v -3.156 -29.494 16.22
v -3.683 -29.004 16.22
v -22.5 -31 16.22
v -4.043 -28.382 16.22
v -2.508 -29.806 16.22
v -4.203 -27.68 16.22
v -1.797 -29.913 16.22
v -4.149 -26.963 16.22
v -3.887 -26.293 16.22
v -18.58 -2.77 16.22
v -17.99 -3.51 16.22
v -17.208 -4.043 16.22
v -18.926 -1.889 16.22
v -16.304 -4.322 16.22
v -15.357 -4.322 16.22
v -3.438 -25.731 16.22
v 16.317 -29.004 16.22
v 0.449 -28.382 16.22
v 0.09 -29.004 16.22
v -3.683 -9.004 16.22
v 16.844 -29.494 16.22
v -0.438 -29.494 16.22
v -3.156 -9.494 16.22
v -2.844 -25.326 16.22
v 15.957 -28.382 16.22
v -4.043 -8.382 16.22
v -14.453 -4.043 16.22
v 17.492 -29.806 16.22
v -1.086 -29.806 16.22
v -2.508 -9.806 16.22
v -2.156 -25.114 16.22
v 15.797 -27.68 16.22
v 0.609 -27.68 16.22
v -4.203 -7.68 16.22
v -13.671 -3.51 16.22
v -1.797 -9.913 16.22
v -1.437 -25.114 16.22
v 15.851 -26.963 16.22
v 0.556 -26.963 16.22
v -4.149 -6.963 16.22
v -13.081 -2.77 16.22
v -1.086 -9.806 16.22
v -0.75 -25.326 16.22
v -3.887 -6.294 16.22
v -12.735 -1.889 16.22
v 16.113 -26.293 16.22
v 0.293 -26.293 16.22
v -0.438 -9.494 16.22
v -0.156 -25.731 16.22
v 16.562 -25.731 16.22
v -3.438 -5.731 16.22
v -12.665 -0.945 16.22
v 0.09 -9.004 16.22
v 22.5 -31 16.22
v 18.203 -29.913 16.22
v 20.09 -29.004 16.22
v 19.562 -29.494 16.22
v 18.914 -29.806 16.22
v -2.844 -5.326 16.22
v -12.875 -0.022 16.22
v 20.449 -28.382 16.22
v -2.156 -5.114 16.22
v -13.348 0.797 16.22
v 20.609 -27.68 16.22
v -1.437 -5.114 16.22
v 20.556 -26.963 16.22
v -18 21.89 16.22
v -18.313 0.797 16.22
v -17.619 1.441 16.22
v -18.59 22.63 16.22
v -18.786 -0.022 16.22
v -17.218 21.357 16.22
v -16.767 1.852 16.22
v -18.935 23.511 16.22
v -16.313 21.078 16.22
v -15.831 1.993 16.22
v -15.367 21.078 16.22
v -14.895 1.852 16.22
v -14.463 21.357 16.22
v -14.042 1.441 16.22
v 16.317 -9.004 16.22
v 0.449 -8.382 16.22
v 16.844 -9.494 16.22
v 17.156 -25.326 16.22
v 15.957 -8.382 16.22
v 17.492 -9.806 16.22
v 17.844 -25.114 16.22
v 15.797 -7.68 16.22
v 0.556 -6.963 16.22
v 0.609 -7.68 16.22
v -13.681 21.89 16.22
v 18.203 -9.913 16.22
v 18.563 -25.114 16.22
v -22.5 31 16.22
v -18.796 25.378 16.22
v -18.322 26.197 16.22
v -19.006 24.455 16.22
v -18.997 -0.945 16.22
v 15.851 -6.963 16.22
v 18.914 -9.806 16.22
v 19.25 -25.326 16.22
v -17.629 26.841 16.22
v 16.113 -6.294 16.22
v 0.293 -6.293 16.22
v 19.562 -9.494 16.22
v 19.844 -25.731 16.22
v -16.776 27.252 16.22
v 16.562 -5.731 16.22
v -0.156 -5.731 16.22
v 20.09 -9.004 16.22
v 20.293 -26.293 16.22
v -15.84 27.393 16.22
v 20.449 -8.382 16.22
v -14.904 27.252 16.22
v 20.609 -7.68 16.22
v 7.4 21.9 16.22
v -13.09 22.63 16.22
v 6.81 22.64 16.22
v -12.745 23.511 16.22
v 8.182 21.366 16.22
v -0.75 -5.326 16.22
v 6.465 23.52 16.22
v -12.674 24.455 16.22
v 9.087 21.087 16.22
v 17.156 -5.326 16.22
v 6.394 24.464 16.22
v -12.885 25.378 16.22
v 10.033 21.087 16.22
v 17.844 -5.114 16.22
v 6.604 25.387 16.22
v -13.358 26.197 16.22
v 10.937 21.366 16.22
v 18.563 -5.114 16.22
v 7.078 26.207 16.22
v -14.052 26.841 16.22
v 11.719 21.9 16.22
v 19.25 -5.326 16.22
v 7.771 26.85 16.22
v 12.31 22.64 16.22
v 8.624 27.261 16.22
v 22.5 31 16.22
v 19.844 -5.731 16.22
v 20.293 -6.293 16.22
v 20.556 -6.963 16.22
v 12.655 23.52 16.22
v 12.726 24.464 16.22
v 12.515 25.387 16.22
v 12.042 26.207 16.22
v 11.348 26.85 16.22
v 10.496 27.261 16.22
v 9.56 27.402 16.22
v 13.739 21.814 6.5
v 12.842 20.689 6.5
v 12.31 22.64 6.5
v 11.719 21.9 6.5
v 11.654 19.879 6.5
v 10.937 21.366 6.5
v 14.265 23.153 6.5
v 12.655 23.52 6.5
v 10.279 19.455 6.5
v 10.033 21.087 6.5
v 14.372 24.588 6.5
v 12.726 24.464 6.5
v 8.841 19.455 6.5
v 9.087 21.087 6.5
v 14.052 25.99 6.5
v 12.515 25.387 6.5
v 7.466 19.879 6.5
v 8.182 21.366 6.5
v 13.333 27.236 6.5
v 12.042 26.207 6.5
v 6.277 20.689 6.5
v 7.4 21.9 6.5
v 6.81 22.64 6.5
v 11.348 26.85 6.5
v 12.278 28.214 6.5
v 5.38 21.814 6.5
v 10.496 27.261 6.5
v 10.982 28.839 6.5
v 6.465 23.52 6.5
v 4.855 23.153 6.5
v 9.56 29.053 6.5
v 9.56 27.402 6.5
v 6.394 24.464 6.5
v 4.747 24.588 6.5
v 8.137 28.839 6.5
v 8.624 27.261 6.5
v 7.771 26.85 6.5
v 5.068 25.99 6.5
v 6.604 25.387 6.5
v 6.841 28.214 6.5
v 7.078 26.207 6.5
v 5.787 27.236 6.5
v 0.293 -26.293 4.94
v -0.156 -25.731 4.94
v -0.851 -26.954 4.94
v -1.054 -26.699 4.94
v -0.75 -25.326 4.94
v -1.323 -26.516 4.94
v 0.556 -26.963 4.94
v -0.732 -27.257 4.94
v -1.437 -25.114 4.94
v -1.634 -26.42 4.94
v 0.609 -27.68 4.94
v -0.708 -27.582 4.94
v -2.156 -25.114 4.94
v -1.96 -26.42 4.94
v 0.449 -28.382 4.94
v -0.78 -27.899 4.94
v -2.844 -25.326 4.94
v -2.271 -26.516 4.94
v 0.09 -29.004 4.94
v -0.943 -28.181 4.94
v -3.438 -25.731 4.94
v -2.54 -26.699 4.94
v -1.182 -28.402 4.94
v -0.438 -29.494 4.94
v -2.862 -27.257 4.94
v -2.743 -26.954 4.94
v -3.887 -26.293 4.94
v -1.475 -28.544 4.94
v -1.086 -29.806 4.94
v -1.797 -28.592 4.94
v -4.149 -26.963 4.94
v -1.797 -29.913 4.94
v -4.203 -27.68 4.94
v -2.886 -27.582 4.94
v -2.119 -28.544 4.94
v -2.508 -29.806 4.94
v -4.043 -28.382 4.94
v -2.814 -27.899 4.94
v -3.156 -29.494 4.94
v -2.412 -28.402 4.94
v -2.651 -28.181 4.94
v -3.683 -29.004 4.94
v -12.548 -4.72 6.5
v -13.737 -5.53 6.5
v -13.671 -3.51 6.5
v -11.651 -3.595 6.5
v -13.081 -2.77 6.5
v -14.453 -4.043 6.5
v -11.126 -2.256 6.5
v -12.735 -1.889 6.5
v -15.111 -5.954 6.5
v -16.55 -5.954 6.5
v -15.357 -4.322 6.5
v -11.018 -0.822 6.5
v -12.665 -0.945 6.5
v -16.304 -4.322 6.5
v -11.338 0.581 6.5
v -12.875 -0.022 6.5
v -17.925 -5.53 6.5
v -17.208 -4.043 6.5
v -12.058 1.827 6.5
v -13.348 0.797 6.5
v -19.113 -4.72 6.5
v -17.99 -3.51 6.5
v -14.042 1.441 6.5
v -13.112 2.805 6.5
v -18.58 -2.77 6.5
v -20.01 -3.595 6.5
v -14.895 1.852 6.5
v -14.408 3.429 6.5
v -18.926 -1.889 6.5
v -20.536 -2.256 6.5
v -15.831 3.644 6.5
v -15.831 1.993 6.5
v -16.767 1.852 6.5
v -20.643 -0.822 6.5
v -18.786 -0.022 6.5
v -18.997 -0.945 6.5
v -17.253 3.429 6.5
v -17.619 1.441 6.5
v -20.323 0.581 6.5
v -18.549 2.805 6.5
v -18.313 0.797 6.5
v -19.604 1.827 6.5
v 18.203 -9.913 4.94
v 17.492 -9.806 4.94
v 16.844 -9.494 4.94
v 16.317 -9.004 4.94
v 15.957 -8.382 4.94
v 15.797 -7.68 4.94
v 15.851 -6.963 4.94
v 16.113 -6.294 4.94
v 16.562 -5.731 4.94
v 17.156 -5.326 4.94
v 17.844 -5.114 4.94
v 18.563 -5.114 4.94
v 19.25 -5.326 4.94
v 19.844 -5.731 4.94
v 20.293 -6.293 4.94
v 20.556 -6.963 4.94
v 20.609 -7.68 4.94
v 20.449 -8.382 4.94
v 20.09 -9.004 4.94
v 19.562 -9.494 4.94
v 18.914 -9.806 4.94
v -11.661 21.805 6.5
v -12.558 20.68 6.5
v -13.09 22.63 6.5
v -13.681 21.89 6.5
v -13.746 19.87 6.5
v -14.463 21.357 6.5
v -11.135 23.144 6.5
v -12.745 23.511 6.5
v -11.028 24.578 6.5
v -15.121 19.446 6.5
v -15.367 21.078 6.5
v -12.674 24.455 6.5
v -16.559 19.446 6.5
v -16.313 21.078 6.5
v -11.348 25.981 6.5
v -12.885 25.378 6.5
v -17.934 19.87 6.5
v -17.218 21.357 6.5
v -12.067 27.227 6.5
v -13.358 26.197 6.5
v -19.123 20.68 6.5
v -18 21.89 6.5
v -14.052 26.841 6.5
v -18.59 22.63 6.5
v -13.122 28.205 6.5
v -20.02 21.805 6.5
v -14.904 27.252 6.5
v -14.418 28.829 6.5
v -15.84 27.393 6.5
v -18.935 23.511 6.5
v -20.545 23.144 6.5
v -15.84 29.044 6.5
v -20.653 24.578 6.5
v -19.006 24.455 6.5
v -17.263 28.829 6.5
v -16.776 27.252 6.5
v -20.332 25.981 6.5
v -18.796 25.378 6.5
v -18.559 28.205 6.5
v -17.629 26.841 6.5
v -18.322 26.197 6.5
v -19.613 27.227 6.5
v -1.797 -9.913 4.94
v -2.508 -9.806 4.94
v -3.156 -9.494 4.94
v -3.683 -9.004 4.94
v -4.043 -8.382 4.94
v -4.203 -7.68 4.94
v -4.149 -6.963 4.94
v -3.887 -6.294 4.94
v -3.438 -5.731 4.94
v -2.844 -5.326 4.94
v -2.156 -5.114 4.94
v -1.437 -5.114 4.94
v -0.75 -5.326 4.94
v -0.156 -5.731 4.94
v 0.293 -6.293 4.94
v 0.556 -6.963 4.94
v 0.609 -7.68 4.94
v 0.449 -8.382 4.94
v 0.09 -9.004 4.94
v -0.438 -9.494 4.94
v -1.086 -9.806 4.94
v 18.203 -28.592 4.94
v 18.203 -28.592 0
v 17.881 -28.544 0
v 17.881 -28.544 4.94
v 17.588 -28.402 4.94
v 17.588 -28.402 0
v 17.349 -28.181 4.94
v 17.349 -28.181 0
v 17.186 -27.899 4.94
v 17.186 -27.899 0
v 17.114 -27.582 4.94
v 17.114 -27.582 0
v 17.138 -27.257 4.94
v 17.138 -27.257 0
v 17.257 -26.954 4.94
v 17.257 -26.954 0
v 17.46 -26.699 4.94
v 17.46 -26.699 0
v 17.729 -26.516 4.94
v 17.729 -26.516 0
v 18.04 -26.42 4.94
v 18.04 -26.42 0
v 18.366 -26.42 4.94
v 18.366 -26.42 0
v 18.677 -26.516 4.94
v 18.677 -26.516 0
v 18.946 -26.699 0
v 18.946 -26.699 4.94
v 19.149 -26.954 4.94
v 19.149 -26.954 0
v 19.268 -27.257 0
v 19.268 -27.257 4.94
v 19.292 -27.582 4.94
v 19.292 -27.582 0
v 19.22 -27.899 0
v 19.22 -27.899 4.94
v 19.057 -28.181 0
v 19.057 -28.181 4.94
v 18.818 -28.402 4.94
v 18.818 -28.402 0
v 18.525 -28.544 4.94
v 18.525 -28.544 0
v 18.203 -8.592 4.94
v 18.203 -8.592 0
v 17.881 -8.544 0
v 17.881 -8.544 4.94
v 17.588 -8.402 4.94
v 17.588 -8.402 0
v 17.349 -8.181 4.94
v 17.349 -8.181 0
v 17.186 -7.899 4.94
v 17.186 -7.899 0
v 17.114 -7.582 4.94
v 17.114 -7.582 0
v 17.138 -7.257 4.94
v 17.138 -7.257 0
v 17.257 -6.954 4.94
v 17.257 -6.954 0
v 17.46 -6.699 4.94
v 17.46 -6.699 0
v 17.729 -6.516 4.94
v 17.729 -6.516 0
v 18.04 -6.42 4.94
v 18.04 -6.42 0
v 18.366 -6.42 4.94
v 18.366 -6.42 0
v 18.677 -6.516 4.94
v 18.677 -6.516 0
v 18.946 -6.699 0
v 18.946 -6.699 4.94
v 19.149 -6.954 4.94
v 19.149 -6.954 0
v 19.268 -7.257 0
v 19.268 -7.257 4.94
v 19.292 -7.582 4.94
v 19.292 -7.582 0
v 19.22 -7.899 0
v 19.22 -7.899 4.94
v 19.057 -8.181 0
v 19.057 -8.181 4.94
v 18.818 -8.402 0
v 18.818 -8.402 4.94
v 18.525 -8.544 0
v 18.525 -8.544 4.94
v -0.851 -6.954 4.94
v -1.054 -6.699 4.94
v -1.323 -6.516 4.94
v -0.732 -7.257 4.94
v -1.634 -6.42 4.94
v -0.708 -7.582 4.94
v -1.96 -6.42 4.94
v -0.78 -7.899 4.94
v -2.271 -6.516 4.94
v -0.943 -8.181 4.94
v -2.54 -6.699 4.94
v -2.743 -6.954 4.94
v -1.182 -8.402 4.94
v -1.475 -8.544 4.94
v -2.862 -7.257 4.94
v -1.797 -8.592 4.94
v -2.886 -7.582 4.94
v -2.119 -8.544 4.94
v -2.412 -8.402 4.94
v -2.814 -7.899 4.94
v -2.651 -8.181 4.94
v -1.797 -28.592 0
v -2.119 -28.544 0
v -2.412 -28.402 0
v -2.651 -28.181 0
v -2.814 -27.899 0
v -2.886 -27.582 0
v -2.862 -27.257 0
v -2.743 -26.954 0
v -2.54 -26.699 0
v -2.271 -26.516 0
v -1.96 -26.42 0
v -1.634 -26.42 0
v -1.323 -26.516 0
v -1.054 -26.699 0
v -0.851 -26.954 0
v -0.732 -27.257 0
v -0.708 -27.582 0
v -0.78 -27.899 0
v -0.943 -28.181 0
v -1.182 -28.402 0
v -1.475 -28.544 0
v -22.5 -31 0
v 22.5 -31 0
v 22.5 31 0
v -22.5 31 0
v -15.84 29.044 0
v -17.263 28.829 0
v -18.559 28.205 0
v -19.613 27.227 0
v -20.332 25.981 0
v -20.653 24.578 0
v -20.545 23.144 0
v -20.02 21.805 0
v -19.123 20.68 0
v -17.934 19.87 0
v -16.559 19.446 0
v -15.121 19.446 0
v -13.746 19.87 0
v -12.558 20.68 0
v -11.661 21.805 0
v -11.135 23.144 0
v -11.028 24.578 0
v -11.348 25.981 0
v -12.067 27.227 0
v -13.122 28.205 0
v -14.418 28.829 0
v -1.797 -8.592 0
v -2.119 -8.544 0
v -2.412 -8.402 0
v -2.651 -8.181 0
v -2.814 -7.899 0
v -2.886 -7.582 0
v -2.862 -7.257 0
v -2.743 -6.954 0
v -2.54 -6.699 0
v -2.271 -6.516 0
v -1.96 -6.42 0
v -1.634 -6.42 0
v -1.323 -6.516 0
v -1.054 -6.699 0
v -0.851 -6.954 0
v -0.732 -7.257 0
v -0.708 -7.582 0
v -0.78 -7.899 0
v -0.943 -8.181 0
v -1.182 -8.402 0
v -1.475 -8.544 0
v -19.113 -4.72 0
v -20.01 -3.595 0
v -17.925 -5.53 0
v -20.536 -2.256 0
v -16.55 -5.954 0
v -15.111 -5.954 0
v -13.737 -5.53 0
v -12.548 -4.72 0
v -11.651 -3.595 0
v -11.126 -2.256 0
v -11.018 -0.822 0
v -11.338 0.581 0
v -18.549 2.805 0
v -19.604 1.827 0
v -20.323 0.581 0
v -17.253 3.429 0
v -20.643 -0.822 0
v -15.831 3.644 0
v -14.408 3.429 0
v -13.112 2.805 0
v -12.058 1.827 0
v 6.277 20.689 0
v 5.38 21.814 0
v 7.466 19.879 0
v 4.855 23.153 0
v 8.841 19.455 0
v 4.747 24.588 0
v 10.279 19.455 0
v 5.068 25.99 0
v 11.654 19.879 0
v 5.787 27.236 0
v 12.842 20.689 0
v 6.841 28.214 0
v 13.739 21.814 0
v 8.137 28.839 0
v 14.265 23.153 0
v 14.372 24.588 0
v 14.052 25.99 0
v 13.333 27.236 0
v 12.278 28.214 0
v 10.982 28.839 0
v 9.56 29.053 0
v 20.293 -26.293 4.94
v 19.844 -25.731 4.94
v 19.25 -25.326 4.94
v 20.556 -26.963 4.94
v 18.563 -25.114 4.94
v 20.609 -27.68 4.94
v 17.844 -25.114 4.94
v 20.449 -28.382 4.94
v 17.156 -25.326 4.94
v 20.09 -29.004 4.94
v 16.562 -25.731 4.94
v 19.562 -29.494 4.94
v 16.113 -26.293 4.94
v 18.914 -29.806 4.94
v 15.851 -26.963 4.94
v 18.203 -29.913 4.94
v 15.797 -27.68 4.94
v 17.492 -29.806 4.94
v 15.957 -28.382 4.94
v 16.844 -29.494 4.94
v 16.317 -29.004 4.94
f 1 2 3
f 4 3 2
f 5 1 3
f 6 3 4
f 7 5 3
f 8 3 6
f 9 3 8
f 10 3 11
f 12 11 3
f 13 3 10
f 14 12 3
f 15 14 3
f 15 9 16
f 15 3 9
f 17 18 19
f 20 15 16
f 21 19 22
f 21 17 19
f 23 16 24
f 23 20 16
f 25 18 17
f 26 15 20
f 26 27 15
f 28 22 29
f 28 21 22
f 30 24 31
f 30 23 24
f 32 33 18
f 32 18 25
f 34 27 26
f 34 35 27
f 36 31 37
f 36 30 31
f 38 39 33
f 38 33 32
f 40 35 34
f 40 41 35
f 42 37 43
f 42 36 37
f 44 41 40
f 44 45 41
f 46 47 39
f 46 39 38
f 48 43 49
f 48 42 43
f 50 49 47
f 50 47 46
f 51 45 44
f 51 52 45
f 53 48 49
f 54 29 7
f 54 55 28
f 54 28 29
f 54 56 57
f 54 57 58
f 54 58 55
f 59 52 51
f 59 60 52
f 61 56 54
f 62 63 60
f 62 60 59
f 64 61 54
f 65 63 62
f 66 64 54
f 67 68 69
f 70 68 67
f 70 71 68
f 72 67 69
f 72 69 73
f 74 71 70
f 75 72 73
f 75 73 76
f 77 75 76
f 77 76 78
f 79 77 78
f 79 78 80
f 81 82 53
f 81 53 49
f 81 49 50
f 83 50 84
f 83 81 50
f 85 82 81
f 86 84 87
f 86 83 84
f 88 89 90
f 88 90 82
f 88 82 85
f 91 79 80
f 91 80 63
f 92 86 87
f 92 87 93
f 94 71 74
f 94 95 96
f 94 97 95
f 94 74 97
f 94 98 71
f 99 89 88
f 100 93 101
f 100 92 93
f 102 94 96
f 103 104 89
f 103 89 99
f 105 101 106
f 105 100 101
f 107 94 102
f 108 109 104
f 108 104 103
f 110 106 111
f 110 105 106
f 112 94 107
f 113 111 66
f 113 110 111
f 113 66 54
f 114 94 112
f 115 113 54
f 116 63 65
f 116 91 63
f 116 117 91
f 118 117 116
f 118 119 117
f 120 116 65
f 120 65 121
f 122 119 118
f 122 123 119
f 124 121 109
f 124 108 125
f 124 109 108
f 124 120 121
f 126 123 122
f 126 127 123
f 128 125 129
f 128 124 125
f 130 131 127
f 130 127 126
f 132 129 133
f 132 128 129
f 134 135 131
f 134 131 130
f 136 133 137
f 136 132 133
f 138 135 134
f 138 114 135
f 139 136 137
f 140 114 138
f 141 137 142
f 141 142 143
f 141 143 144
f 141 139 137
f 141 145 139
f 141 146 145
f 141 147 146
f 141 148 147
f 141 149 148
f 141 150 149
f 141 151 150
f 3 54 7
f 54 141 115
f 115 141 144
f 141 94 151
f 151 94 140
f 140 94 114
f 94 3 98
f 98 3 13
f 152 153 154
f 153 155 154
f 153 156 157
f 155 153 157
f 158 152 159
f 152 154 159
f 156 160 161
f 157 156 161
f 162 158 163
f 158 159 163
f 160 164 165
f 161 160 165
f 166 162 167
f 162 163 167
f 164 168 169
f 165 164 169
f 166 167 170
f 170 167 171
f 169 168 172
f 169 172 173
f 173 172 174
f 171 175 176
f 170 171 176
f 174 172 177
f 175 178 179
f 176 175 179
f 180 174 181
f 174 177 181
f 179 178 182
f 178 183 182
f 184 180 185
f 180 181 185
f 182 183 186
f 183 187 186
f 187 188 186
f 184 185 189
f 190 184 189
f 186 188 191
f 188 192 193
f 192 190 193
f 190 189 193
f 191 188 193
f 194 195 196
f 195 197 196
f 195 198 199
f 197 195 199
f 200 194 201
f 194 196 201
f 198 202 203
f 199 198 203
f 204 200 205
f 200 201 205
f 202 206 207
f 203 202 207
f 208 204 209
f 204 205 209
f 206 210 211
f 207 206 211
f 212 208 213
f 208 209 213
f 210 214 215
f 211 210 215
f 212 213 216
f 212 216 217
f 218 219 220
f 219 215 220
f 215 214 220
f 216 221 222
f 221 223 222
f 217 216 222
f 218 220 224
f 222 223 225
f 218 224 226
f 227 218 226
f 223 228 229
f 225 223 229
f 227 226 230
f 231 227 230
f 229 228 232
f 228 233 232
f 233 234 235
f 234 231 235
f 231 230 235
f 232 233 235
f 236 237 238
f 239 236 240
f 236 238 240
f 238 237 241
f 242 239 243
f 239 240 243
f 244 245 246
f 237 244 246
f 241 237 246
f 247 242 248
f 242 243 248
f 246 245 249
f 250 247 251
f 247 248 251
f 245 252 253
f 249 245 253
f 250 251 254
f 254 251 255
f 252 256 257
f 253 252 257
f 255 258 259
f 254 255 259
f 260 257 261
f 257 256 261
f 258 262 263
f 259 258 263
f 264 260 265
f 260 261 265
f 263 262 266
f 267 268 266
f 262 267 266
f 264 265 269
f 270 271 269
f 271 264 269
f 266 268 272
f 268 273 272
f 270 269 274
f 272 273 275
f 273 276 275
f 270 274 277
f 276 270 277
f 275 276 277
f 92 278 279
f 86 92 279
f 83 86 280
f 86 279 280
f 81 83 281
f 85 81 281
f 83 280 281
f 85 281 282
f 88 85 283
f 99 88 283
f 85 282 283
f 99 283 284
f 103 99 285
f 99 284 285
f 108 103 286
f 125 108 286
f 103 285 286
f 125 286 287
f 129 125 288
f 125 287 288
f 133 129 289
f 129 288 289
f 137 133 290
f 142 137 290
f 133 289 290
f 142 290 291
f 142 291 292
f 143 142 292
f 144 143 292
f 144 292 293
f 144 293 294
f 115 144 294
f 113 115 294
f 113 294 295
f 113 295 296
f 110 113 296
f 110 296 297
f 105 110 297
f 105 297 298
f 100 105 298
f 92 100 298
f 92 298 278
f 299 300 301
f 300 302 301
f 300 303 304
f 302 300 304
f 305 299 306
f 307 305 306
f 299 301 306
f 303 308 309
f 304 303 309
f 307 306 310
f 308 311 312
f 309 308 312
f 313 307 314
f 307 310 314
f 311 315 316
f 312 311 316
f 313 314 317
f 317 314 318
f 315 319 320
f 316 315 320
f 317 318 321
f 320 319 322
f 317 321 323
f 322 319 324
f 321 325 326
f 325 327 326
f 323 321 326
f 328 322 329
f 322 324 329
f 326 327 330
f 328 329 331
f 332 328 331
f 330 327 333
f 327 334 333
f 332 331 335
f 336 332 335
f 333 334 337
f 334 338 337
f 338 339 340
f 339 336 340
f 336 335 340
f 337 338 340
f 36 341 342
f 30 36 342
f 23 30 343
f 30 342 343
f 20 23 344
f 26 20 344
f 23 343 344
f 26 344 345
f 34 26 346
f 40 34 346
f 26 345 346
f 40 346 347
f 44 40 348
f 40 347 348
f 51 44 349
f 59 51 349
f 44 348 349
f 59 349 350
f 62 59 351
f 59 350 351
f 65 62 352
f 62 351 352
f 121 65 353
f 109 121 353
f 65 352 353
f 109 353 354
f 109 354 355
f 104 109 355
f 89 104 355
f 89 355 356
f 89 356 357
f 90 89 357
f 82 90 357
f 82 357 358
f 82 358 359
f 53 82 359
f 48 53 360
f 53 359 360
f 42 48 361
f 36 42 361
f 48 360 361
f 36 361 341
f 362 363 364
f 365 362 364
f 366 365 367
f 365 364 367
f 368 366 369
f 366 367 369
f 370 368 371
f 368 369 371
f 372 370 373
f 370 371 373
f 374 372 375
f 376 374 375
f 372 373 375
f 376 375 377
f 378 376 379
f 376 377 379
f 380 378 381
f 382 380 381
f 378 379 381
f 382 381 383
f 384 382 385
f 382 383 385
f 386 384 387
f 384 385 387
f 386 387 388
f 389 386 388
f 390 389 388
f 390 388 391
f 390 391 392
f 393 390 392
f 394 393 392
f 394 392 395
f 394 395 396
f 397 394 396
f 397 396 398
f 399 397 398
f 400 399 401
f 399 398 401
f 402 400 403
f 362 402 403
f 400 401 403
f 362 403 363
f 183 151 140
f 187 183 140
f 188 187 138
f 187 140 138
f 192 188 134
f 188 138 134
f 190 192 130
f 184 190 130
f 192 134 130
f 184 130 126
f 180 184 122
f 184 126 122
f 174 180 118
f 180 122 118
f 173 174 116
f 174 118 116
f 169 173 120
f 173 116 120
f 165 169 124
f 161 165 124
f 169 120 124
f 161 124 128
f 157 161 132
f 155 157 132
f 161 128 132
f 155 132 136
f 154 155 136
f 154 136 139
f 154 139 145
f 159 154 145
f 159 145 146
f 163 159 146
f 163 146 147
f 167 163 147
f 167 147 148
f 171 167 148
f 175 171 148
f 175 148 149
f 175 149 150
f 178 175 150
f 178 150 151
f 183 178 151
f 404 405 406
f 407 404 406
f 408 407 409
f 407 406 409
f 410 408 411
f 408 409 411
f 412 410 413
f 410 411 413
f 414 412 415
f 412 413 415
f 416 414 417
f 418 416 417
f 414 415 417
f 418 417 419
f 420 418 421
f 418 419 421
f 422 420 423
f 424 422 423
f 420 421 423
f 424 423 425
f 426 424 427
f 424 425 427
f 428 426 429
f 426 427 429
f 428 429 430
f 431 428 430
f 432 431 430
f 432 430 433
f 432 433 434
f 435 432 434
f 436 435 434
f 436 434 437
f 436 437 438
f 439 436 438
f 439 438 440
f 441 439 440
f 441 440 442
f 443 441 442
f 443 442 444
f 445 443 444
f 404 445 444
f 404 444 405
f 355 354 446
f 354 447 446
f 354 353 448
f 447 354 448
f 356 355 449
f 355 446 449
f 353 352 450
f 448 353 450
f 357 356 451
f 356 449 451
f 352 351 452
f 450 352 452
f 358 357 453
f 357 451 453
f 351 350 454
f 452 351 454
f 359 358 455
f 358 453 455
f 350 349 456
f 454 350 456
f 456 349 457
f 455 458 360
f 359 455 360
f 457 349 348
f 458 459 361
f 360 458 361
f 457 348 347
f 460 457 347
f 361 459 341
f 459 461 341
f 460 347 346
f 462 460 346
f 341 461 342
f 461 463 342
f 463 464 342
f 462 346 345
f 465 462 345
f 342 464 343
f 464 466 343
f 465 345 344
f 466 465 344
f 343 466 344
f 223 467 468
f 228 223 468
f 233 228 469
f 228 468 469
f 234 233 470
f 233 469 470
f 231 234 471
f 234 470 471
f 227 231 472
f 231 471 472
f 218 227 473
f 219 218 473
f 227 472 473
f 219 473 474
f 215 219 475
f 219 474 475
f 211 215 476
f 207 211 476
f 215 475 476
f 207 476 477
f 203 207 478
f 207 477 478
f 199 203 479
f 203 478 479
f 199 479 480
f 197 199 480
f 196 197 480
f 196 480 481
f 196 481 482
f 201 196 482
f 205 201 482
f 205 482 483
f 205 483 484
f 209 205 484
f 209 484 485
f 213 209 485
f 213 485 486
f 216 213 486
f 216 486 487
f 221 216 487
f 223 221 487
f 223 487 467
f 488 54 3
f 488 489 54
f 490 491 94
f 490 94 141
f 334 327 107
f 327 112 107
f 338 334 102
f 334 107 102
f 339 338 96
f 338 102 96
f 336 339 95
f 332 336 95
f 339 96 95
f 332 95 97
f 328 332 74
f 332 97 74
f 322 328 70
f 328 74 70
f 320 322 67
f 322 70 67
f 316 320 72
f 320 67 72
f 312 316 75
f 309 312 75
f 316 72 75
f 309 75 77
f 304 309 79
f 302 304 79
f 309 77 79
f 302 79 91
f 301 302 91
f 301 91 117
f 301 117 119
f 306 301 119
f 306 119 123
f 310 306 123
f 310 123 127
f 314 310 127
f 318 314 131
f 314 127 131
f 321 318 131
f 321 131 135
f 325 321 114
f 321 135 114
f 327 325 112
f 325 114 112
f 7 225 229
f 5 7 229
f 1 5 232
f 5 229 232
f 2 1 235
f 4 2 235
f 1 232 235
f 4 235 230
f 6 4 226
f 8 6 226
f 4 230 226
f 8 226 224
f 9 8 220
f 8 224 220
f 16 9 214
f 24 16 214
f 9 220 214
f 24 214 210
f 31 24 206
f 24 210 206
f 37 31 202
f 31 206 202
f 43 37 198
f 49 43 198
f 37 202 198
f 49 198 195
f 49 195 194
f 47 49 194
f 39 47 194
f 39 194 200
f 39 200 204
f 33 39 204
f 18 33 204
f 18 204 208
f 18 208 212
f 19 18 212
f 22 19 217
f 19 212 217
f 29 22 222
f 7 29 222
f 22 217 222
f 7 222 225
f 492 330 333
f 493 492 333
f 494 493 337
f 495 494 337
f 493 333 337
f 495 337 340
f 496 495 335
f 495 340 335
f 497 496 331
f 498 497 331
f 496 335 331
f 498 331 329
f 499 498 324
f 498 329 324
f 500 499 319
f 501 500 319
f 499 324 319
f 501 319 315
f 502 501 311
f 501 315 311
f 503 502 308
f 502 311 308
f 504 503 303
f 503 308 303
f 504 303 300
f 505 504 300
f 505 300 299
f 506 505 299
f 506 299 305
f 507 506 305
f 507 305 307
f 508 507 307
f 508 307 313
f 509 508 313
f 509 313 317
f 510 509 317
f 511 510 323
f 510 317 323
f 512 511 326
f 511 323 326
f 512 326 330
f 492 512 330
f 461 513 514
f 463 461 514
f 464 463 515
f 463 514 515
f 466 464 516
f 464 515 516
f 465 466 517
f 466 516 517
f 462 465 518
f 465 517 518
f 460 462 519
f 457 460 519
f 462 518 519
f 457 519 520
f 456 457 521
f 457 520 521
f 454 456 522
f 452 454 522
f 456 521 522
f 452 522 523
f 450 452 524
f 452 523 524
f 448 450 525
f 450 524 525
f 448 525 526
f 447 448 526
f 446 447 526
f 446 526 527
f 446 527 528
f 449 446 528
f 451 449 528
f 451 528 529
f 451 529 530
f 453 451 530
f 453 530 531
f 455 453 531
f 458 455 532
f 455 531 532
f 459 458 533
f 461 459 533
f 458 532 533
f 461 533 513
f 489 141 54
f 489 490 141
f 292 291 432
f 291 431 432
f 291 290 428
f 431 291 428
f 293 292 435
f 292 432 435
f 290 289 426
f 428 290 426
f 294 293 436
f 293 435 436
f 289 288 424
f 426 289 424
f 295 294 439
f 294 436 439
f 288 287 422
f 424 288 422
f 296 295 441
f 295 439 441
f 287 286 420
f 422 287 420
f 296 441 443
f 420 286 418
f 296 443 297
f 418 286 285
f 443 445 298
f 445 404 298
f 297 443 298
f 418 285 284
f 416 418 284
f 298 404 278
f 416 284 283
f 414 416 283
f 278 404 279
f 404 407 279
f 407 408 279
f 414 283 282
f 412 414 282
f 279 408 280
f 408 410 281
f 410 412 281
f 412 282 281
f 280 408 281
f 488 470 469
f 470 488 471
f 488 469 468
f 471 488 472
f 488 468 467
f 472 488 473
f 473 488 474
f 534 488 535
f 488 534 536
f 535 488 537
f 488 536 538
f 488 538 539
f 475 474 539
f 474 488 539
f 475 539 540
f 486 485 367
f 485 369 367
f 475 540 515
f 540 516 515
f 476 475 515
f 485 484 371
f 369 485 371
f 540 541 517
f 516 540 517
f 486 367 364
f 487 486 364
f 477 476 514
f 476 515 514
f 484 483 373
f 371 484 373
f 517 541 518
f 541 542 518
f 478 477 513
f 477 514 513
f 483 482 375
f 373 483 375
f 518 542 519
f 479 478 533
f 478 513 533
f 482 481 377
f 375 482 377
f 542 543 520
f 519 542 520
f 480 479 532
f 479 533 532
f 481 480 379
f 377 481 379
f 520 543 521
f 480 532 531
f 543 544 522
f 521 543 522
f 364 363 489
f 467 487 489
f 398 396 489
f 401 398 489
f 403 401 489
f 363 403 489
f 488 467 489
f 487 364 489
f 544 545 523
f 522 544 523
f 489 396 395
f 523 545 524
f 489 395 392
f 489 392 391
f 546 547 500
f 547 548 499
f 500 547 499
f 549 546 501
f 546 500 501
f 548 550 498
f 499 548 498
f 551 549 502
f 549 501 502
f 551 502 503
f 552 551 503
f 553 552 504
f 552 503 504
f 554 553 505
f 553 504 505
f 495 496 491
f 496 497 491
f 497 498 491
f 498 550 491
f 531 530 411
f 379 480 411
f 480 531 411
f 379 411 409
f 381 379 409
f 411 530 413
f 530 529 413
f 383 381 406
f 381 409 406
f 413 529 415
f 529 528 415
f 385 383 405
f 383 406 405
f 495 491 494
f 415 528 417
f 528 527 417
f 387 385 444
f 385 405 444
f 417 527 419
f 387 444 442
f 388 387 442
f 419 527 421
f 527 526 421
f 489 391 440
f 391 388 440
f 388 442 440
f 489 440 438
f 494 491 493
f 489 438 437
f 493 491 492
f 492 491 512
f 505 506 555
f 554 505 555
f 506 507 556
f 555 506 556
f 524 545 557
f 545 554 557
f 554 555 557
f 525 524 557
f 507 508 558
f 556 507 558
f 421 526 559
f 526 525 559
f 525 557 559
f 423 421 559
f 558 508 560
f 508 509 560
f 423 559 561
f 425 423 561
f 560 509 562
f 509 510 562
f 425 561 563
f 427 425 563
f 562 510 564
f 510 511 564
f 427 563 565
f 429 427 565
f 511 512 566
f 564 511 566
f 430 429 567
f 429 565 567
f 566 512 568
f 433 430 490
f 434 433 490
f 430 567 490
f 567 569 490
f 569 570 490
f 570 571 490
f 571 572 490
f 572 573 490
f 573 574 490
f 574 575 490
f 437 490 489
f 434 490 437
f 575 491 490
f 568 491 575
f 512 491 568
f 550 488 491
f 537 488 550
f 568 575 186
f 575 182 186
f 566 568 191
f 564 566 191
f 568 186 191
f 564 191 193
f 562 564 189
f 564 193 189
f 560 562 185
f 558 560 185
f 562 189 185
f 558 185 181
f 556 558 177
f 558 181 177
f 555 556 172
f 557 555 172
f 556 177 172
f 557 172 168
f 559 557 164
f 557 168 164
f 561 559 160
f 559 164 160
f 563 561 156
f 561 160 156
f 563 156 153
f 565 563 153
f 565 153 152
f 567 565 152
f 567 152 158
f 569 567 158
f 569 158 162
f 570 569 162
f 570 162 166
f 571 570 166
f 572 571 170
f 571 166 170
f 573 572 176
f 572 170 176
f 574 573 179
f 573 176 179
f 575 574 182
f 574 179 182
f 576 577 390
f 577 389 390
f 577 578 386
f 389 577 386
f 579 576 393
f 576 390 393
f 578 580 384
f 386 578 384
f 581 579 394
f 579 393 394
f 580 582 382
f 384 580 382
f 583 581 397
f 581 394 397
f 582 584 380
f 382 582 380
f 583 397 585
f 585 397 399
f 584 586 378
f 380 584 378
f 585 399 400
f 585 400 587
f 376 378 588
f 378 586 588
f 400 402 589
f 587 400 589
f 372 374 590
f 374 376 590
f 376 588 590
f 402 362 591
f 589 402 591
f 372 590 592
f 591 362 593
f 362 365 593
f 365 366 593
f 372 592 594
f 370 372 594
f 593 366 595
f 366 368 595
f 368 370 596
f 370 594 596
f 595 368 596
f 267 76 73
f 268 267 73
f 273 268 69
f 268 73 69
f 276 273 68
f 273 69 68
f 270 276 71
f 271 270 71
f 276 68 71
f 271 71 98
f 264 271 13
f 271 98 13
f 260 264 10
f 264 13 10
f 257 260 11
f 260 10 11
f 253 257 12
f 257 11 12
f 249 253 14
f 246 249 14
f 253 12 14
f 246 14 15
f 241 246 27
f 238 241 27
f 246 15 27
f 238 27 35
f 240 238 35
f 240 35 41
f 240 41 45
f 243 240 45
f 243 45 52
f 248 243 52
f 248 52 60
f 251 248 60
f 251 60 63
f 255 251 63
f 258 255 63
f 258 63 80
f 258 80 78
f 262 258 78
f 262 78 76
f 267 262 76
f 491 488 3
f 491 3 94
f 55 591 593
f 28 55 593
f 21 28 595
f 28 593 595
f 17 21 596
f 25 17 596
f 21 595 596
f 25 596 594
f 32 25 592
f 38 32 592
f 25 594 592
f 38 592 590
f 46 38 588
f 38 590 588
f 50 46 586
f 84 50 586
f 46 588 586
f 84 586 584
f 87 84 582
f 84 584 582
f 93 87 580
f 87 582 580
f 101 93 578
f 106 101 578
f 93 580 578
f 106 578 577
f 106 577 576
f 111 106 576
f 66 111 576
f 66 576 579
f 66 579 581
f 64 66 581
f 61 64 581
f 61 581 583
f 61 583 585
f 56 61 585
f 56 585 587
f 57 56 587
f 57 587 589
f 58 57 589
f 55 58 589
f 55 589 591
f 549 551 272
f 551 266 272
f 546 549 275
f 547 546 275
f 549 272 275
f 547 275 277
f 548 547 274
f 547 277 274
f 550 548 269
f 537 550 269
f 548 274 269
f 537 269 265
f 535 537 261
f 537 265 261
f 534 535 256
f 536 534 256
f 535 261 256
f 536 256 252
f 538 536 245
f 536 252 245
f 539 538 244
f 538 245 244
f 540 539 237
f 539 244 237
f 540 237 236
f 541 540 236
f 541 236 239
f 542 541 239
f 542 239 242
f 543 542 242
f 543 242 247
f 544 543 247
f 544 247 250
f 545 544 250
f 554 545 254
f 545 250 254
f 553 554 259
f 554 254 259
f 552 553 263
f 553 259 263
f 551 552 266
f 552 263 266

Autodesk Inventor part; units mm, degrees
ref_plane "YZ Plane" through (0, 0, 0) normal (1, 0, 0) x (0, 1, 0)
ref_plane "XZ Plane" through (0, 0, 0) normal (0, 1, 0) x (-1, 0, 0)
ref_plane "XY Plane" through (0, 0, 0) normal (0, 0, 1) x (1, 0, 0)
sketch "Sketch1" plane through (0, 0, 0) normal (0, 0, 1) x (1, 0, 0)
  line L0 (-22.5, 31) -> (22.5, 31)
  line L1 (22.5, 31) -> (22.5, -31)
  line L2 (22.5, -31) -> (-22.5, -31)
  line L3 (-22.5, -31) -> (-22.5, 31)
  point P0 (0, 0)
  dimension "d0" = 45
  dimension "d1" = 62
  dimension "d2" = 31
  dimension "d3" = 22.5
extrude "Extrusion1" add sketch "Sketch1" along normal blind 16.2198
sketch "Sketch2" plane through (0, 0, 0) normal (0, 0, -1) x (-1, 0, 0)
  arc A0 (79.5379, 557.794) -> (67.0425, 570.2987) centre (67.0379, 557.7987) ccw
  line L0 (67.0425, 570.2987) -> (-365.1574, 570.4588)
  arc A1 (-365.1574, 570.4588) -> (-377.6621, 557.9635) centre (-365.1621, 557.9588) ccw
  line L1 (-377.6621, 557.9635) -> (-377.8787, -26.6365)
  arc A2 (-377.8787, -26.6365) -> (-365.3834, -39.1411) centre (-365.3787, -26.6411) ccw
  line L2 (-365.3834, -39.1411) -> (66.8166, -39.3013)
  arc A3 (66.8166, -39.3013) -> (79.3212, -26.8059) centre (66.8212, -26.8013) ccw
  line L3 (79.3212, -26.8059) -> (79.5379, 557.794)
  circle A4 centre (-339.5621, 557.7494) radius 2.5527
  circle A5 centre (-314.1622, 557.7399) radius 2.5527
  circle A6 centre (-288.7622, 557.7305) radius 2.5527
  circle A7 centre (-263.3622, 557.7211) radius 2.5527
  circle A8 centre (-237.9622, 557.7117) radius 2.5527
  circle A9 centre (-212.5622, 557.7023) radius 2.5527
  circle A10 centre (-187.1622, 557.6929) radius 2.5527
  circle A11 centre (-161.7622, 557.6835) radius 2.5527
  circle A12 centre (-136.3622, 557.674) radius 2.5527
  circle A13 centre (-110.9622, 557.6646) radius 2.5527
  circle A14 centre (-85.5622, 557.6552) radius 2.5527
  circle A15 centre (-60.1622, 557.6458) radius 2.5527
  circle A16 centre (-34.7622, 557.6364) radius 2.5527
  circle A17 centre (-9.3622, 557.627) radius 2.5527
  circle A18 centre (16.0378, 557.6176) radius 2.5527
  circle A19 centre (41.4378, 557.6081) radius 2.5527
  circle A20 centre (66.8378, 557.5987) radius 2.5527
  circle A21 centre (-364.9716, 532.3588) radius 2.5527
  circle A22 centre (-339.5716, 532.3494) radius 2.5527
  circle A23 centre (-314.1716, 532.3399) radius 2.5527
  circle A24 centre (-288.7716, 532.3305) radius 2.5527
  circle A25 centre (-263.3716, 532.3211) radius 2.5527
  circle A26 centre (-237.9716, 532.3117) radius 2.5527
  circle A27 centre (-212.5716, 532.3023) radius 2.5527
  circle A28 centre (-187.1716, 532.2929) radius 2.5527
  circle A29 centre (-161.7716, 532.2835) radius 2.5527
  circle A30 centre (-136.3716, 532.274) radius 2.5527
  circle A31 centre (-110.9716, 532.2646) radius 2.5527
  circle A32 centre (-85.5716, 532.2552) radius 2.5527
  circle A33 centre (-60.1716, 532.2458) radius 2.5527
  circle A34 centre (-34.7716, 532.2364) radius 2.5527
  circle A35 centre (-9.3716, 532.227) radius 2.5527
  circle A36 centre (16.0284, 532.2176) radius 2.5527
  circle A37 centre (41.4284, 532.2081) radius 2.5527
  circle A38 centre (66.8284, 532.1987) radius 2.5527
  circle A39 centre (-364.981, 506.9588) radius 2.5527
  circle A40 centre (-339.581, 506.9494) radius 2.5527
  circle A41 centre (-314.181, 506.9399) radius 2.5527
  circle A42 centre (-288.781, 506.9305) radius 2.5527
  circle A43 centre (-263.381, 506.9211) radius 2.5527
  circle A44 centre (-237.981, 506.9117) radius 2.5527
  circle A45 centre (-212.581, 506.9023) radius 2.5527
  circle A46 centre (-187.181, 506.8929) radius 2.5527
  circle A47 centre (-161.781, 506.8835) radius 2.5527
  circle A48 centre (-136.381, 506.874) radius 2.5527
  circle A49 centre (-110.981, 506.8646) radius 2.5527
  circle A50 centre (-85.581, 506.8552) radius 2.5527
  circle A51 centre (-60.181, 506.8458) radius 2.5527
  circle A52 centre (-34.781, 506.8364) radius 2.5527
  circle A53 centre (-9.381, 506.827) radius 2.5527
  circle A54 centre (16.019, 506.8176) radius 2.5527
  circle A55 centre (41.419, 506.8082) radius 2.5527
  circle A56 centre (66.819, 506.7987) radius 2.5527
  circle A57 centre (-364.9904, 481.5588) radius 2.5527
  circle A58 centre (-339.5904, 481.5494) radius 2.5527
  circle A59 centre (-314.1904, 481.5399) radius 2.5527
  circle A60 centre (-288.7904, 481.5305) radius 2.5527
  circle A61 centre (-263.3904, 481.5211) radius 2.5527
  circle A62 centre (-237.9904, 481.5117) radius 2.5527
  circle A63 centre (-212.5904, 481.5023) radius 2.5527
  circle A64 centre (-187.1904, 481.4929) radius 2.5527
  circle A65 centre (-161.7904, 481.4835) radius 2.5527
  circle A66 centre (-136.3904, 481.474) radius 2.5527
  circle A67 centre (-110.9904, 481.4646) radius 2.5527
  circle A68 centre (-85.5904, 481.4552) radius 2.5527
  circle A69 centre (-60.1904, 481.4458) radius 2.5527
  circle A70 centre (-34.7904, 481.4364) radius 2.5527
  circle A71 centre (-9.3904, 481.427) radius 2.5527
  circle A72 centre (16.0096, 481.4176) radius 2.5527
  circle A73 centre (41.4096, 481.4082) radius 2.5527
  circle A74 centre (66.8096, 481.3987) radius 2.5527
  circle A75 centre (-364.9998, 456.1588) radius 2.5527
  circle A76 centre (-339.5998, 456.1494) radius 2.5527
  circle A77 centre (-314.1998, 456.1399) radius 2.5527
  circle A78 centre (-288.7998, 456.1305) radius 2.5527
  circle A79 centre (-263.3998, 456.1211) radius 2.5527
  circle A80 centre (-237.9998, 456.1117) radius 2.5527
  circle A81 centre (-212.5998, 456.1023) radius 2.5527
  circle A82 centre (-187.1998, 456.0929) radius 2.5527
  circle A83 centre (-161.7998, 456.0835) radius 2.5527
  circle A84 centre (-136.3998, 456.074) radius 2.5527
  circle A85 centre (-110.9998, 456.0646) radius 2.5527
  circle A86 centre (-85.5998, 456.0552) radius 2.5527
  circle A87 centre (-60.1998, 456.0458) radius 2.5527
  circle A88 centre (-34.7998, 456.0364) radius 2.5527
  circle A89 centre (-9.3998, 456.027) radius 2.5527
  circle A90 centre (16.0002, 456.0176) radius 2.5527
  circle A91 centre (41.4002, 456.0082) radius 2.5527
  circle A92 centre (66.8002, 455.9987) radius 2.5527
  circle A93 centre (-365.0092, 430.7588) radius 2.5527
  circle A94 centre (-339.6092, 430.7494) radius 2.5527
  circle A95 centre (-314.2092, 430.7399) radius 2.5527
  circle A96 centre (-288.8092, 430.7305) radius 2.5527
  circle A97 centre (-263.4092, 430.7211) radius 2.5527
  circle A98 centre (-238.0092, 430.7117) radius 2.5527
  circle A99 centre (-212.6092, 430.7023) radius 2.5527
  circle A100 centre (-187.2092, 430.6929) radius 2.5527
  circle A101 centre (-161.8092, 430.6835) radius 2.5527
  circle A102 centre (-136.4092, 430.6741) radius 2.5527
  circle A103 centre (-111.0092, 430.6646) radius 2.5527
  circle A104 centre (-85.6092, 430.6552) radius 2.5527
  circle A105 centre (-60.2092, 430.6458) radius 2.5527
  circle A106 centre (-34.8092, 430.6364) radius 2.5527
  circle A107 centre (-9.4092, 430.627) radius 2.5527
  circle A108 centre (15.9908, 430.6176) radius 2.5527
  circle A109 centre (41.3908, 430.6082) radius 2.5527
  circle A110 centre (66.7908, 430.5987) radius 2.5527
  circle A111 centre (-365.0186, 405.3588) radius 2.5527
  circle A112 centre (-339.6186, 405.3494) radius 2.5527
  circle A113 centre (-314.2186, 405.3399) radius 2.5527
  circle A114 centre (-288.8186, 405.3305) radius 2.5527
  circle A115 centre (-263.4186, 405.3211) radius 2.5527
  circle A116 centre (-238.0186, 405.3117) radius 2.5527
  circle A117 centre (-212.6186, 405.3023) radius 2.5527
  circle A118 centre (-187.2186, 405.2929) radius 2.5527
  circle A119 centre (-161.8186, 405.2835) radius 2.5527
  circle A120 centre (-136.4186, 405.2741) radius 2.5527
  circle A121 centre (-111.0186, 405.2646) radius 2.5527
  circle A122 centre (-85.6186, 405.2552) radius 2.5527
  circle A123 centre (-60.2186, 405.2458) radius 2.5527
  circle A124 centre (-34.8187, 405.2364) radius 2.5527
  circle A125 centre (-9.4187, 405.227) radius 2.5527
  circle A126 centre (15.9813, 405.2176) radius 2.5527
  circle A127 centre (41.3813, 405.2082) radius 2.5527
  circle A128 centre (66.7813, 405.1987) radius 2.5527
  circle A129 centre (-365.028, 379.9588) radius 2.5527
  circle A130 centre (-339.628, 379.9494) radius 2.5527
  circle A131 centre (-314.228, 379.94) radius 2.5527
  circle A132 centre (-288.828, 379.9305) radius 2.5527
  circle A133 centre (-263.428, 379.9211) radius 2.5527
  circle A134 centre (-238.0281, 379.9117) radius 2.5527
  circle A135 centre (-212.6281, 379.9023) radius 2.5527
  circle A136 centre (-187.2281, 379.8929) radius 2.5527
  circle A137 centre (-161.8281, 379.8835) radius 2.5527
  circle A138 centre (-136.4281, 379.8741) radius 2.5527
  circle A139 centre (-111.0281, 379.8646) radius 2.5527
  circle A140 centre (-85.6281, 379.8552) radius 2.5527
  circle A141 centre (-60.2281, 379.8458) radius 2.5527
  circle A142 centre (-34.8281, 379.8364) radius 2.5527
  circle A143 centre (-9.4281, 379.827) radius 2.5527
  circle A144 centre (15.9719, 379.8176) radius 2.5527
  circle A145 centre (41.3719, 379.8082) radius 2.5527
  circle A146 centre (66.7719, 379.7987) radius 2.5527
  circle A147 centre (-365.0375, 354.5588) radius 2.5527
  circle A148 centre (-339.6375, 354.5494) radius 2.5527
  circle A149 centre (-314.2375, 354.54) radius 2.5527
  circle A150 centre (-288.8375, 354.5305) radius 2.5527
  circle A151 centre (-263.4375, 354.5211) radius 2.5527
  circle A152 centre (-238.0375, 354.5117) radius 2.5527
  circle A153 centre (-212.6375, 354.5023) radius 2.5527
  circle A154 centre (-187.2375, 354.4929) radius 2.5527
  circle A155 centre (-161.8375, 354.4835) radius 2.5527
  circle A156 centre (-136.4375, 354.4741) radius 2.5527
  circle A157 centre (-111.0375, 354.4646) radius 2.5527
  circle A158 centre (-85.6375, 354.4552) radius 2.5527
  circle A159 centre (-60.2375, 354.4458) radius 2.5527
  circle A160 centre (-34.8375, 354.4364) radius 2.5527
  circle A161 centre (-9.4375, 354.427) radius 2.5527
  circle A162 centre (15.9625, 354.4176) radius 2.5527
  circle A163 centre (41.3625, 354.4082) radius 2.5527
  circle A164 centre (66.7625, 354.3987) radius 2.5527
  circle A165 centre (-365.0469, 329.1588) radius 2.5527
  circle A166 centre (-339.6469, 329.1494) radius 2.5527
  circle A167 centre (-314.2469, 329.14) radius 2.5527
  circle A168 centre (-288.8469, 329.1305) radius 2.5527
  circle A169 centre (-263.4469, 329.1211) radius 2.5527
  circle A170 centre (-238.0469, 329.1117) radius 2.5527
  circle A171 centre (-212.6469, 329.1023) radius 2.5527
  circle A172 centre (-187.2469, 329.0929) radius 2.5527
  circle A173 centre (-161.8469, 329.0835) radius 2.5527
  circle A174 centre (-136.4469, 329.0741) radius 2.5527
  circle A175 centre (-111.0469, 329.0646) radius 2.5527
  circle A176 centre (-85.6469, 329.0552) radius 2.5527
  circle A177 centre (-60.2469, 329.0458) radius 2.5527
  circle A178 centre (-34.8469, 329.0364) radius 2.5527
  circle A179 centre (-9.4469, 329.027) radius 2.5527
  circle A180 centre (15.9531, 329.0176) radius 2.5527
  circle A181 centre (41.3531, 329.0082) radius 2.5527
  circle A182 centre (66.7531, 328.9987) radius 2.5527
  circle A183 centre (-365.0563, 303.7588) radius 2.5527
  circle A184 centre (-339.6563, 303.7494) radius 2.5527
  circle A185 centre (-314.2563, 303.74) radius 2.5527
  circle A186 centre (-288.8563, 303.7305) radius 2.5527
  circle A187 centre (-263.4563, 303.7211) radius 2.5527
  circle A188 centre (-238.0563, 303.7117) radius 2.5527
  circle A189 centre (-212.6563, 303.7023) radius 2.5527
  circle A190 centre (-187.2563, 303.6929) radius 2.5527
  circle A191 centre (-161.8563, 303.6835) radius 2.5527
  circle A192 centre (-136.4563, 303.6741) radius 2.5527
  circle A193 centre (-111.0563, 303.6646) radius 2.5527
  circle A194 centre (-85.6563, 303.6552) radius 2.5527
  circle A195 centre (-60.2563, 303.6458) radius 2.5527
  circle A196 centre (-34.8563, 303.6364) radius 2.5527
  circle A197 centre (-9.4563, 303.627) radius 2.5527
  circle A198 centre (15.9437, 303.6176) radius 2.5527
  circle A199 centre (41.3437, 303.6082) radius 2.5527
  circle A200 centre (66.7437, 303.5988) radius 2.5527
  circle A201 centre (-365.0657, 278.3588) radius 2.5527
  circle A202 centre (-339.6657, 278.3494) radius 2.5527
  circle A203 centre (-314.2657, 278.34) radius 2.5527
  circle A204 centre (-288.8657, 278.3305) radius 2.5527
  circle A205 centre (-263.4657, 278.3211) radius 2.5527
  circle A206 centre (-238.0657, 278.3117) radius 2.5527
  circle A207 centre (-212.6657, 278.3023) radius 2.5527
  circle A208 centre (-187.2657, 278.2929) radius 2.5527
  circle A209 centre (-161.8657, 278.2835) radius 2.5527
  circle A210 centre (-136.4657, 278.2741) radius 2.5527
  circle A211 centre (-111.0657, 278.2646) radius 2.5527
  circle A212 centre (-85.6657, 278.2552) radius 2.5527
  circle A213 centre (-60.2657, 278.2458) radius 2.5527
  circle A214 centre (-34.8657, 278.2364) radius 2.5527
  circle A215 centre (-9.4657, 278.227) radius 2.5527
  circle A216 centre (15.9343, 278.2176) radius 2.5527
  circle A217 centre (41.3343, 278.2082) radius 2.5527
  circle A218 centre (66.7343, 278.1988) radius 2.5527
  circle A219 centre (-365.0751, 252.9588) radius 2.5527
  circle A220 centre (-339.6751, 252.9494) radius 2.5527
  circle A221 centre (-314.2751, 252.94) radius 2.5527
  circle A222 centre (-288.8751, 252.9305) radius 2.5527
  circle A223 centre (-263.4751, 252.9211) radius 2.5527
  circle A224 centre (-238.0751, 252.9117) radius 2.5527
  circle A225 centre (-212.6751, 252.9023) radius 2.5527
  circle A226 centre (-187.2751, 252.8929) radius 2.5527
  circle A227 centre (-161.8751, 252.8835) radius 2.5527
  circle A228 centre (-136.4751, 252.8741) radius 2.5527
  circle A229 centre (-111.0751, 252.8647) radius 2.5527
  circle A230 centre (-85.6751, 252.8552) radius 2.5527
  circle A231 centre (-60.2751, 252.8458) radius 2.5527
  circle A232 centre (-34.8751, 252.8364) radius 2.5527
  circle A233 centre (-9.4751, 252.827) radius 2.5527
  circle A234 centre (15.9249, 252.8176) radius 2.5527
  circle A235 centre (41.3249, 252.8082) radius 2.5527
  circle A236 centre (66.7249, 252.7988) radius 2.5527
  circle A237 centre (-365.0845, 227.5588) radius 2.5527
  circle A238 centre (-339.6845, 227.5494) radius 2.5527
  circle A239 centre (-314.2845, 227.54) radius 2.5527
  circle A240 centre (-288.8845, 227.5305) radius 2.5527
  circle A241 centre (-263.4845, 227.5211) radius 2.5527
  circle A242 centre (-238.0845, 227.5117) radius 2.5527
  circle A243 centre (-212.6845, 227.5023) radius 2.5527
  circle A244 centre (-187.2845, 227.4929) radius 2.5527
  circle A245 centre (-161.8845, 227.4835) radius 2.5527
  circle A246 centre (-136.4845, 227.4741) radius 2.5527
  circle A247 centre (-111.0845, 227.4647) radius 2.5527
  circle A248 centre (-85.6845, 227.4552) radius 2.5527
  circle A249 centre (-60.2845, 227.4458) radius 2.5527
  circle A250 centre (-34.8845, 227.4364) radius 2.5527
  circle A251 centre (-9.4845, 227.427) radius 2.5527
  circle A252 centre (15.9154, 227.4176) radius 2.5527
  circle A253 centre (41.3154, 227.4082) radius 2.5527
  circle A254 centre (66.7154, 227.3988) radius 2.5527
  circle A255 centre (-365.0939, 202.1588) radius 2.5527
  circle A256 centre (-339.6939, 202.1494) radius 2.5527
  circle A257 centre (-314.2939, 202.14) radius 2.5527
  circle A258 centre (-288.8939, 202.1305) radius 2.5527
  circle A259 centre (-263.4939, 202.1211) radius 2.5527
  circle A260 centre (-238.0939, 202.1117) radius 2.5527
  circle A261 centre (-212.6939, 202.1023) radius 2.5527
  circle A262 centre (-187.294, 202.0929) radius 2.5527
  circle A263 centre (-161.894, 202.0835) radius 2.5527
  circle A264 centre (-136.494, 202.0741) radius 2.5527
  circle A265 centre (-111.094, 202.0647) radius 2.5527
  circle A266 centre (-85.694, 202.0552) radius 2.5527
  circle A267 centre (-60.294, 202.0458) radius 2.5527
  circle A268 centre (-34.894, 202.0364) radius 2.5527
  circle A269 centre (-9.494, 202.027) radius 2.5527
  circle A270 centre (15.906, 202.0176) radius 2.5527
  circle A271 centre (41.306, 202.0082) radius 2.5527
  circle A272 centre (66.706, 201.9988) radius 2.5527
  circle A273 centre (-365.1034, 176.7588) radius 2.5527
  circle A274 centre (-339.7034, 176.7494) radius 2.5527
  circle A275 centre (-314.3034, 176.74) radius 2.5527
  circle A276 centre (-288.9034, 176.7306) radius 2.5527
  circle A277 centre (-263.5034, 176.7211) radius 2.5527
  circle A278 centre (-238.1034, 176.7117) radius 2.5527
  circle A279 centre (-212.7034, 176.7023) radius 2.5527
  circle A280 centre (-187.3034, 176.6929) radius 2.5527
  circle A281 centre (-161.9034, 176.6835) radius 2.5527
  circle A282 centre (-136.5034, 176.6741) radius 2.5527
  circle A283 centre (-111.1034, 176.6647) radius 2.5527
  circle A284 centre (-85.7034, 176.6552) radius 2.5527
  circle A285 centre (-60.3034, 176.6458) radius 2.5527
  circle A286 centre (-34.9034, 176.6364) radius 2.5527
  circle A287 centre (-9.5034, 176.627) radius 2.5527
  circle A288 centre (15.8966, 176.6176) radius 2.5527
  circle A289 centre (41.2966, 176.6082) radius 2.5527
  circle A290 centre (66.6966, 176.5988) radius 2.5527
  circle A291 centre (-365.1128, 151.3588) radius 2.5527
  circle A292 centre (-339.7128, 151.3494) radius 2.5527
  circle A293 centre (-314.3128, 151.34) radius 2.5527
  circle A294 centre (-288.9128, 151.3306) radius 2.5527
  circle A295 centre (-263.5128, 151.3211) radius 2.5527
  circle A296 centre (-238.1128, 151.3117) radius 2.5527
  circle A297 centre (-212.7128, 151.3023) radius 2.5527
  circle A298 centre (-187.3128, 151.2929) radius 2.5527
  circle A299 centre (-161.9128, 151.2835) radius 2.5527
  circle A300 centre (-136.5128, 151.2741) radius 2.5527
  circle A301 centre (-111.1128, 151.2647) radius 2.5527
  circle A302 centre (-85.7128, 151.2552) radius 2.5527
  circle A303 centre (-60.3128, 151.2458) radius 2.5527
  circle A304 centre (-34.9128, 151.2364) radius 2.5527
  circle A305 centre (-9.5128, 151.227) radius 2.5527
  circle A306 centre (15.8872, 151.2176) radius 2.5527
  circle A307 centre (41.2872, 151.2082) radius 2.5527
  circle A308 centre (66.6872, 151.1988) radius 2.5527
  circle A309 centre (-365.1222, 125.9588) radius 2.5527
  circle A310 centre (-339.7222, 125.9494) radius 2.5527
  circle A311 centre (-314.3222, 125.94) radius 2.5527
  circle A312 centre (-288.9222, 125.9306) radius 2.5527
  circle A313 centre (-263.5222, 125.9211) radius 2.5527
  circle A314 centre (-238.1222, 125.9117) radius 2.5527
  circle A315 centre (-212.7222, 125.9023) radius 2.5527
  circle A316 centre (-187.3222, 125.8929) radius 2.5527
  circle A317 centre (-161.9222, 125.8835) radius 2.5527
  circle A318 centre (-136.5222, 125.8741) radius 2.5527
  circle A319 centre (-111.1222, 125.8647) radius 2.5527
  circle A320 centre (-85.7222, 125.8552) radius 2.5527
  circle A321 centre (-60.3222, 125.8458) radius 2.5527
  circle A322 centre (-34.9222, 125.8364) radius 2.5527
  circle A323 centre (-9.5222, 125.827) radius 2.5527
  circle A324 centre (15.8778, 125.8176) radius 2.5527
  circle A325 centre (41.2778, 125.8082) radius 2.5527
  circle A326 centre (66.6778, 125.7988) radius 2.5527
  circle A327 centre (-365.1316, 100.5588) radius 2.5527
  circle A328 centre (-339.7316, 100.5494) radius 2.5527
  circle A329 centre (-314.3316, 100.54) radius 2.5527
  circle A330 centre (-288.9316, 100.5306) radius 2.5527
  circle A331 centre (-263.5316, 100.5211) radius 2.5527
  circle A332 centre (-238.1316, 100.5117) radius 2.5527
  circle A333 centre (-212.7316, 100.5023) radius 2.5527
  circle A334 centre (-187.3316, 100.4929) radius 2.5527
  circle A335 centre (-161.9316, 100.4835) radius 2.5527
  circle A336 centre (-136.5316, 100.4741) radius 2.5527
  circle A337 centre (-111.1316, 100.4647) radius 2.5527
  circle A338 centre (-85.7316, 100.4552) radius 2.5527
  circle A339 centre (-60.3316, 100.4458) radius 2.5527
  circle A340 centre (-34.9316, 100.4364) radius 2.5527
  circle A341 centre (-9.5316, 100.427) radius 2.5527
  circle A342 centre (15.8684, 100.4176) radius 2.5527
  circle A343 centre (41.2684, 100.4082) radius 2.5527
  circle A344 centre (66.6684, 100.3988) radius 2.5527
  circle A345 centre (-365.141, 75.1588) radius 2.5527
  circle A346 centre (-339.741, 75.1494) radius 2.5527
  circle A347 centre (-314.341, 75.14) radius 2.5527
  circle A348 centre (-288.941, 75.1306) radius 2.5527
  circle A349 centre (-263.541, 75.1211) radius 2.5527
  circle A350 centre (-238.141, 75.1117) radius 2.5527
  circle A351 centre (-212.741, 75.1023) radius 2.5527
  circle A352 centre (-187.341, 75.0929) radius 2.5527
  circle A353 centre (-161.941, 75.0835) radius 2.5527
  circle A354 centre (-136.541, 75.0741) radius 2.5527
  circle A355 centre (-111.141, 75.0647) radius 2.5527
  circle A356 centre (-85.741, 75.0552) radius 2.5527
  circle A357 centre (-60.341, 75.0458) radius 2.5527
  circle A358 centre (-34.941, 75.0364) radius 2.5527
  circle A359 centre (-9.541, 75.027) radius 2.5527
  circle A360 centre (15.859, 75.0176) radius 2.5527
  circle A361 centre (41.259, 75.0082) radius 2.5527
  circle A362 centre (66.659, 74.9988) radius 2.5527
  circle A363 centre (-365.1504, 49.7588) radius 2.5527
  circle A364 centre (-339.7504, 49.7494) radius 2.5527
  circle A365 centre (-314.3504, 49.74) radius 2.5527
  circle A366 centre (-288.9504, 49.7306) radius 2.5527
  circle A367 centre (-263.5504, 49.7211) radius 2.5527
  circle A368 centre (-238.1504, 49.7117) radius 2.5527
  circle A369 centre (-212.7504, 49.7023) radius 2.5527
  circle A370 centre (-187.3504, 49.6929) radius 2.5527
  circle A371 centre (-161.9504, 49.6835) radius 2.5527
  circle A372 centre (-136.5504, 49.6741) radius 2.5527
  circle A373 centre (-111.1504, 49.6647) radius 2.5527
  circle A374 centre (-85.7504, 49.6553) radius 2.5527
  circle A375 centre (-60.3504, 49.6458) radius 2.5527
  circle A376 centre (-34.9504, 49.6364) radius 2.5527
  circle A377 centre (-9.5504, 49.627) radius 2.5527
  circle A378 centre (15.8496, 49.6176) radius 2.5527
  circle A379 centre (41.2496, 49.6082) radius 2.5527
  circle A380 centre (66.6496, 49.5988) radius 2.5527
  circle A381 centre (-365.1598, 24.3588) radius 2.5527
  circle A382 centre (-339.7598, 24.3494) radius 2.5527
  circle A383 centre (-314.3598, 24.34) radius 2.5527
  circle A384 centre (-288.9598, 24.3306) radius 2.5527
  circle A385 centre (-263.5598, 24.3211) radius 2.5527
  circle A386 centre (-238.1598, 24.3117) radius 2.5527
  circle A387 centre (-212.7598, 24.3023) radius 2.5527
  circle A388 centre (-187.3598, 24.2929) radius 2.5527
  circle A389 centre (-161.9598, 24.2835) radius 2.5527
  circle A390 centre (-136.5598, 24.2741) radius 2.5527
  circle A391 centre (-111.1599, 24.2647) radius 2.5527
  circle A392 centre (-85.7599, 24.2553) radius 2.5527
  circle A393 centre (-60.3599, 24.2458) radius 2.5527
  circle A394 centre (-34.9599, 24.2364) radius 2.5527
  circle A395 centre (-9.5599, 24.227) radius 2.5527
  circle A396 centre (15.8401, 24.2176) radius 2.5527
  circle A397 centre (41.2401, 24.2082) radius 2.5527
  circle A398 centre (66.6401, 24.1988) radius 2.5527
  circle A399 centre (-365.1692, -1.0412) radius 2.5527
  circle A400 centre (-339.7692, -1.0506) radius 2.5527
  circle A401 centre (-314.3693, -1.06) radius 2.5527
  circle A402 centre (-288.9693, -1.0694) radius 2.5527
  circle A403 centre (-263.5693, -1.0789) radius 2.5527
  circle A404 centre (-238.1693, -1.0883) radius 2.5527
  circle A405 centre (-212.7693, -1.0977) radius 2.5527
  circle A406 centre (-187.3693, -1.1071) radius 2.5527
  circle A407 centre (-161.9693, -1.1165) radius 2.5527
  circle A408 centre (-136.5693, -1.1259) radius 2.5527
  circle A409 centre (-111.1693, -1.1353) radius 2.5527
  circle A410 centre (-85.7693, -1.1447) radius 2.5527
  circle A411 centre (-60.3693, -1.1542) radius 2.5527
  circle A412 centre (-34.9693, -1.1636) radius 2.5527
  circle A413 centre (-9.5693, -1.173) radius 2.5527
  circle A414 centre (15.8307, -1.1824) radius 2.5527
  circle A415 centre (41.2307, -1.1918) radius 2.5527
  circle A416 centre (66.6307, -1.2012) radius 2.5527
  circle A417 centre (-365.1787, -26.4412) radius 2.5527
  circle A418 centre (-339.7787, -26.4506) radius 2.5527
  circle A419 centre (-314.3787, -26.46) radius 2.5527
  circle A420 centre (-288.9787, -26.4694) radius 2.5527
  circle A421 centre (-263.5787, -26.4788) radius 2.5527
  circle A422 centre (-238.1787, -26.4883) radius 2.5527
  circle A423 centre (-212.7787, -26.4977) radius 2.5527
  circle A424 centre (-187.3787, -26.5071) radius 2.5527
  circle A425 centre (-161.9787, -26.5165) radius 2.5527
  circle A426 centre (-136.5787, -26.5259) radius 2.5527
  circle A427 centre (-111.1787, -26.5353) radius 2.5527
  circle A428 centre (-85.7787, -26.5447) radius 2.5527
  circle A429 centre (-60.3787, -26.5542) radius 2.5527
  circle A430 centre (-34.9787, -26.5636) radius 2.5527
  circle A431 centre (-9.5787, -26.573) radius 2.5527
  circle A432 centre (15.8213, -26.5824) radius 2.5527
  circle A433 centre (41.2213, -26.5918) radius 2.5527
  circle A434 centre (66.6213, -26.6012) radius 2.5527
  circle A435 centre (-364.9621, 557.7588) radius 2.5527
  point P0 (0, 0)
hole "Hole1" at (9.5599, 24.227, 0) at (-15.8401, 24.2176, 0) at (-15.8307, -1.1824, 0) direction (0, 0, 1) diameter 6.35 end through all counterbore diameter 9.652 counterbore depth 6.5
sketch "Sketch3" plane through (0, 0, 16.2198) normal (0, 0, 1) x (1, 0, 0)
  circle A0 centre (18.2032, -27.5) radius 0.889
  circle A1 centre (-1.7968, -27.5) radius 1.0922
  line L0 (20.7032, -5.508) -> (20.7032, -5)
  line L1 (20.7032, -5) -> (-4.2967, -5.0001)
  line L2 (-4.2967, -5.0001) -> (-4.2967, -30)
  line L3 (-4.2967, -30) -> (20.7032, -30)
  line L4 (20.7032, -30) -> (20.7032, -29.492)
  line L5 (20.7032, -29.492) -> (21.008, -29.492)
  line L6 (21.008, -5.508) -> (21.008, -29.492)
  line L7 (20.7032, -5.508) -> (21.008, -5.508)
  circle A2 centre (18.2032, -7.5) radius 0.889
  circle A3 centre (-1.7968, -7.5) radius 0.889
  circle A4 centre (18.2032, -27.5) radius 0.889
  circle A5 centre (-1.7968, -27.5) radius 0.889
  circle A6 centre (14.5532, -11.15) radius 1.7272
  circle A7 centre (1.8532, -11.15) radius 1.7272
  circle A8 centre (14.5532, -23.85) radius 1.7272
  circle A9 centre (1.8532, -23.85) radius 1.7272
  circle A10 centre (8.2032, -17.5) radius 1.7272
  point P0 (0, 0)
hole "Hole2" at (18.2032, -7.5, 16.2198) at (-1.7968, -7.5, 16.2198) at (-1.7968, -27.5, 16.2198) at (18.2032, -27.5, 16.2198) direction (0, 0, -1) diameter 2.1844 end through all counterbore diameter 4.826 counterbore depth 11.28
properties part number "baseplate for combined beam steering mirror"
